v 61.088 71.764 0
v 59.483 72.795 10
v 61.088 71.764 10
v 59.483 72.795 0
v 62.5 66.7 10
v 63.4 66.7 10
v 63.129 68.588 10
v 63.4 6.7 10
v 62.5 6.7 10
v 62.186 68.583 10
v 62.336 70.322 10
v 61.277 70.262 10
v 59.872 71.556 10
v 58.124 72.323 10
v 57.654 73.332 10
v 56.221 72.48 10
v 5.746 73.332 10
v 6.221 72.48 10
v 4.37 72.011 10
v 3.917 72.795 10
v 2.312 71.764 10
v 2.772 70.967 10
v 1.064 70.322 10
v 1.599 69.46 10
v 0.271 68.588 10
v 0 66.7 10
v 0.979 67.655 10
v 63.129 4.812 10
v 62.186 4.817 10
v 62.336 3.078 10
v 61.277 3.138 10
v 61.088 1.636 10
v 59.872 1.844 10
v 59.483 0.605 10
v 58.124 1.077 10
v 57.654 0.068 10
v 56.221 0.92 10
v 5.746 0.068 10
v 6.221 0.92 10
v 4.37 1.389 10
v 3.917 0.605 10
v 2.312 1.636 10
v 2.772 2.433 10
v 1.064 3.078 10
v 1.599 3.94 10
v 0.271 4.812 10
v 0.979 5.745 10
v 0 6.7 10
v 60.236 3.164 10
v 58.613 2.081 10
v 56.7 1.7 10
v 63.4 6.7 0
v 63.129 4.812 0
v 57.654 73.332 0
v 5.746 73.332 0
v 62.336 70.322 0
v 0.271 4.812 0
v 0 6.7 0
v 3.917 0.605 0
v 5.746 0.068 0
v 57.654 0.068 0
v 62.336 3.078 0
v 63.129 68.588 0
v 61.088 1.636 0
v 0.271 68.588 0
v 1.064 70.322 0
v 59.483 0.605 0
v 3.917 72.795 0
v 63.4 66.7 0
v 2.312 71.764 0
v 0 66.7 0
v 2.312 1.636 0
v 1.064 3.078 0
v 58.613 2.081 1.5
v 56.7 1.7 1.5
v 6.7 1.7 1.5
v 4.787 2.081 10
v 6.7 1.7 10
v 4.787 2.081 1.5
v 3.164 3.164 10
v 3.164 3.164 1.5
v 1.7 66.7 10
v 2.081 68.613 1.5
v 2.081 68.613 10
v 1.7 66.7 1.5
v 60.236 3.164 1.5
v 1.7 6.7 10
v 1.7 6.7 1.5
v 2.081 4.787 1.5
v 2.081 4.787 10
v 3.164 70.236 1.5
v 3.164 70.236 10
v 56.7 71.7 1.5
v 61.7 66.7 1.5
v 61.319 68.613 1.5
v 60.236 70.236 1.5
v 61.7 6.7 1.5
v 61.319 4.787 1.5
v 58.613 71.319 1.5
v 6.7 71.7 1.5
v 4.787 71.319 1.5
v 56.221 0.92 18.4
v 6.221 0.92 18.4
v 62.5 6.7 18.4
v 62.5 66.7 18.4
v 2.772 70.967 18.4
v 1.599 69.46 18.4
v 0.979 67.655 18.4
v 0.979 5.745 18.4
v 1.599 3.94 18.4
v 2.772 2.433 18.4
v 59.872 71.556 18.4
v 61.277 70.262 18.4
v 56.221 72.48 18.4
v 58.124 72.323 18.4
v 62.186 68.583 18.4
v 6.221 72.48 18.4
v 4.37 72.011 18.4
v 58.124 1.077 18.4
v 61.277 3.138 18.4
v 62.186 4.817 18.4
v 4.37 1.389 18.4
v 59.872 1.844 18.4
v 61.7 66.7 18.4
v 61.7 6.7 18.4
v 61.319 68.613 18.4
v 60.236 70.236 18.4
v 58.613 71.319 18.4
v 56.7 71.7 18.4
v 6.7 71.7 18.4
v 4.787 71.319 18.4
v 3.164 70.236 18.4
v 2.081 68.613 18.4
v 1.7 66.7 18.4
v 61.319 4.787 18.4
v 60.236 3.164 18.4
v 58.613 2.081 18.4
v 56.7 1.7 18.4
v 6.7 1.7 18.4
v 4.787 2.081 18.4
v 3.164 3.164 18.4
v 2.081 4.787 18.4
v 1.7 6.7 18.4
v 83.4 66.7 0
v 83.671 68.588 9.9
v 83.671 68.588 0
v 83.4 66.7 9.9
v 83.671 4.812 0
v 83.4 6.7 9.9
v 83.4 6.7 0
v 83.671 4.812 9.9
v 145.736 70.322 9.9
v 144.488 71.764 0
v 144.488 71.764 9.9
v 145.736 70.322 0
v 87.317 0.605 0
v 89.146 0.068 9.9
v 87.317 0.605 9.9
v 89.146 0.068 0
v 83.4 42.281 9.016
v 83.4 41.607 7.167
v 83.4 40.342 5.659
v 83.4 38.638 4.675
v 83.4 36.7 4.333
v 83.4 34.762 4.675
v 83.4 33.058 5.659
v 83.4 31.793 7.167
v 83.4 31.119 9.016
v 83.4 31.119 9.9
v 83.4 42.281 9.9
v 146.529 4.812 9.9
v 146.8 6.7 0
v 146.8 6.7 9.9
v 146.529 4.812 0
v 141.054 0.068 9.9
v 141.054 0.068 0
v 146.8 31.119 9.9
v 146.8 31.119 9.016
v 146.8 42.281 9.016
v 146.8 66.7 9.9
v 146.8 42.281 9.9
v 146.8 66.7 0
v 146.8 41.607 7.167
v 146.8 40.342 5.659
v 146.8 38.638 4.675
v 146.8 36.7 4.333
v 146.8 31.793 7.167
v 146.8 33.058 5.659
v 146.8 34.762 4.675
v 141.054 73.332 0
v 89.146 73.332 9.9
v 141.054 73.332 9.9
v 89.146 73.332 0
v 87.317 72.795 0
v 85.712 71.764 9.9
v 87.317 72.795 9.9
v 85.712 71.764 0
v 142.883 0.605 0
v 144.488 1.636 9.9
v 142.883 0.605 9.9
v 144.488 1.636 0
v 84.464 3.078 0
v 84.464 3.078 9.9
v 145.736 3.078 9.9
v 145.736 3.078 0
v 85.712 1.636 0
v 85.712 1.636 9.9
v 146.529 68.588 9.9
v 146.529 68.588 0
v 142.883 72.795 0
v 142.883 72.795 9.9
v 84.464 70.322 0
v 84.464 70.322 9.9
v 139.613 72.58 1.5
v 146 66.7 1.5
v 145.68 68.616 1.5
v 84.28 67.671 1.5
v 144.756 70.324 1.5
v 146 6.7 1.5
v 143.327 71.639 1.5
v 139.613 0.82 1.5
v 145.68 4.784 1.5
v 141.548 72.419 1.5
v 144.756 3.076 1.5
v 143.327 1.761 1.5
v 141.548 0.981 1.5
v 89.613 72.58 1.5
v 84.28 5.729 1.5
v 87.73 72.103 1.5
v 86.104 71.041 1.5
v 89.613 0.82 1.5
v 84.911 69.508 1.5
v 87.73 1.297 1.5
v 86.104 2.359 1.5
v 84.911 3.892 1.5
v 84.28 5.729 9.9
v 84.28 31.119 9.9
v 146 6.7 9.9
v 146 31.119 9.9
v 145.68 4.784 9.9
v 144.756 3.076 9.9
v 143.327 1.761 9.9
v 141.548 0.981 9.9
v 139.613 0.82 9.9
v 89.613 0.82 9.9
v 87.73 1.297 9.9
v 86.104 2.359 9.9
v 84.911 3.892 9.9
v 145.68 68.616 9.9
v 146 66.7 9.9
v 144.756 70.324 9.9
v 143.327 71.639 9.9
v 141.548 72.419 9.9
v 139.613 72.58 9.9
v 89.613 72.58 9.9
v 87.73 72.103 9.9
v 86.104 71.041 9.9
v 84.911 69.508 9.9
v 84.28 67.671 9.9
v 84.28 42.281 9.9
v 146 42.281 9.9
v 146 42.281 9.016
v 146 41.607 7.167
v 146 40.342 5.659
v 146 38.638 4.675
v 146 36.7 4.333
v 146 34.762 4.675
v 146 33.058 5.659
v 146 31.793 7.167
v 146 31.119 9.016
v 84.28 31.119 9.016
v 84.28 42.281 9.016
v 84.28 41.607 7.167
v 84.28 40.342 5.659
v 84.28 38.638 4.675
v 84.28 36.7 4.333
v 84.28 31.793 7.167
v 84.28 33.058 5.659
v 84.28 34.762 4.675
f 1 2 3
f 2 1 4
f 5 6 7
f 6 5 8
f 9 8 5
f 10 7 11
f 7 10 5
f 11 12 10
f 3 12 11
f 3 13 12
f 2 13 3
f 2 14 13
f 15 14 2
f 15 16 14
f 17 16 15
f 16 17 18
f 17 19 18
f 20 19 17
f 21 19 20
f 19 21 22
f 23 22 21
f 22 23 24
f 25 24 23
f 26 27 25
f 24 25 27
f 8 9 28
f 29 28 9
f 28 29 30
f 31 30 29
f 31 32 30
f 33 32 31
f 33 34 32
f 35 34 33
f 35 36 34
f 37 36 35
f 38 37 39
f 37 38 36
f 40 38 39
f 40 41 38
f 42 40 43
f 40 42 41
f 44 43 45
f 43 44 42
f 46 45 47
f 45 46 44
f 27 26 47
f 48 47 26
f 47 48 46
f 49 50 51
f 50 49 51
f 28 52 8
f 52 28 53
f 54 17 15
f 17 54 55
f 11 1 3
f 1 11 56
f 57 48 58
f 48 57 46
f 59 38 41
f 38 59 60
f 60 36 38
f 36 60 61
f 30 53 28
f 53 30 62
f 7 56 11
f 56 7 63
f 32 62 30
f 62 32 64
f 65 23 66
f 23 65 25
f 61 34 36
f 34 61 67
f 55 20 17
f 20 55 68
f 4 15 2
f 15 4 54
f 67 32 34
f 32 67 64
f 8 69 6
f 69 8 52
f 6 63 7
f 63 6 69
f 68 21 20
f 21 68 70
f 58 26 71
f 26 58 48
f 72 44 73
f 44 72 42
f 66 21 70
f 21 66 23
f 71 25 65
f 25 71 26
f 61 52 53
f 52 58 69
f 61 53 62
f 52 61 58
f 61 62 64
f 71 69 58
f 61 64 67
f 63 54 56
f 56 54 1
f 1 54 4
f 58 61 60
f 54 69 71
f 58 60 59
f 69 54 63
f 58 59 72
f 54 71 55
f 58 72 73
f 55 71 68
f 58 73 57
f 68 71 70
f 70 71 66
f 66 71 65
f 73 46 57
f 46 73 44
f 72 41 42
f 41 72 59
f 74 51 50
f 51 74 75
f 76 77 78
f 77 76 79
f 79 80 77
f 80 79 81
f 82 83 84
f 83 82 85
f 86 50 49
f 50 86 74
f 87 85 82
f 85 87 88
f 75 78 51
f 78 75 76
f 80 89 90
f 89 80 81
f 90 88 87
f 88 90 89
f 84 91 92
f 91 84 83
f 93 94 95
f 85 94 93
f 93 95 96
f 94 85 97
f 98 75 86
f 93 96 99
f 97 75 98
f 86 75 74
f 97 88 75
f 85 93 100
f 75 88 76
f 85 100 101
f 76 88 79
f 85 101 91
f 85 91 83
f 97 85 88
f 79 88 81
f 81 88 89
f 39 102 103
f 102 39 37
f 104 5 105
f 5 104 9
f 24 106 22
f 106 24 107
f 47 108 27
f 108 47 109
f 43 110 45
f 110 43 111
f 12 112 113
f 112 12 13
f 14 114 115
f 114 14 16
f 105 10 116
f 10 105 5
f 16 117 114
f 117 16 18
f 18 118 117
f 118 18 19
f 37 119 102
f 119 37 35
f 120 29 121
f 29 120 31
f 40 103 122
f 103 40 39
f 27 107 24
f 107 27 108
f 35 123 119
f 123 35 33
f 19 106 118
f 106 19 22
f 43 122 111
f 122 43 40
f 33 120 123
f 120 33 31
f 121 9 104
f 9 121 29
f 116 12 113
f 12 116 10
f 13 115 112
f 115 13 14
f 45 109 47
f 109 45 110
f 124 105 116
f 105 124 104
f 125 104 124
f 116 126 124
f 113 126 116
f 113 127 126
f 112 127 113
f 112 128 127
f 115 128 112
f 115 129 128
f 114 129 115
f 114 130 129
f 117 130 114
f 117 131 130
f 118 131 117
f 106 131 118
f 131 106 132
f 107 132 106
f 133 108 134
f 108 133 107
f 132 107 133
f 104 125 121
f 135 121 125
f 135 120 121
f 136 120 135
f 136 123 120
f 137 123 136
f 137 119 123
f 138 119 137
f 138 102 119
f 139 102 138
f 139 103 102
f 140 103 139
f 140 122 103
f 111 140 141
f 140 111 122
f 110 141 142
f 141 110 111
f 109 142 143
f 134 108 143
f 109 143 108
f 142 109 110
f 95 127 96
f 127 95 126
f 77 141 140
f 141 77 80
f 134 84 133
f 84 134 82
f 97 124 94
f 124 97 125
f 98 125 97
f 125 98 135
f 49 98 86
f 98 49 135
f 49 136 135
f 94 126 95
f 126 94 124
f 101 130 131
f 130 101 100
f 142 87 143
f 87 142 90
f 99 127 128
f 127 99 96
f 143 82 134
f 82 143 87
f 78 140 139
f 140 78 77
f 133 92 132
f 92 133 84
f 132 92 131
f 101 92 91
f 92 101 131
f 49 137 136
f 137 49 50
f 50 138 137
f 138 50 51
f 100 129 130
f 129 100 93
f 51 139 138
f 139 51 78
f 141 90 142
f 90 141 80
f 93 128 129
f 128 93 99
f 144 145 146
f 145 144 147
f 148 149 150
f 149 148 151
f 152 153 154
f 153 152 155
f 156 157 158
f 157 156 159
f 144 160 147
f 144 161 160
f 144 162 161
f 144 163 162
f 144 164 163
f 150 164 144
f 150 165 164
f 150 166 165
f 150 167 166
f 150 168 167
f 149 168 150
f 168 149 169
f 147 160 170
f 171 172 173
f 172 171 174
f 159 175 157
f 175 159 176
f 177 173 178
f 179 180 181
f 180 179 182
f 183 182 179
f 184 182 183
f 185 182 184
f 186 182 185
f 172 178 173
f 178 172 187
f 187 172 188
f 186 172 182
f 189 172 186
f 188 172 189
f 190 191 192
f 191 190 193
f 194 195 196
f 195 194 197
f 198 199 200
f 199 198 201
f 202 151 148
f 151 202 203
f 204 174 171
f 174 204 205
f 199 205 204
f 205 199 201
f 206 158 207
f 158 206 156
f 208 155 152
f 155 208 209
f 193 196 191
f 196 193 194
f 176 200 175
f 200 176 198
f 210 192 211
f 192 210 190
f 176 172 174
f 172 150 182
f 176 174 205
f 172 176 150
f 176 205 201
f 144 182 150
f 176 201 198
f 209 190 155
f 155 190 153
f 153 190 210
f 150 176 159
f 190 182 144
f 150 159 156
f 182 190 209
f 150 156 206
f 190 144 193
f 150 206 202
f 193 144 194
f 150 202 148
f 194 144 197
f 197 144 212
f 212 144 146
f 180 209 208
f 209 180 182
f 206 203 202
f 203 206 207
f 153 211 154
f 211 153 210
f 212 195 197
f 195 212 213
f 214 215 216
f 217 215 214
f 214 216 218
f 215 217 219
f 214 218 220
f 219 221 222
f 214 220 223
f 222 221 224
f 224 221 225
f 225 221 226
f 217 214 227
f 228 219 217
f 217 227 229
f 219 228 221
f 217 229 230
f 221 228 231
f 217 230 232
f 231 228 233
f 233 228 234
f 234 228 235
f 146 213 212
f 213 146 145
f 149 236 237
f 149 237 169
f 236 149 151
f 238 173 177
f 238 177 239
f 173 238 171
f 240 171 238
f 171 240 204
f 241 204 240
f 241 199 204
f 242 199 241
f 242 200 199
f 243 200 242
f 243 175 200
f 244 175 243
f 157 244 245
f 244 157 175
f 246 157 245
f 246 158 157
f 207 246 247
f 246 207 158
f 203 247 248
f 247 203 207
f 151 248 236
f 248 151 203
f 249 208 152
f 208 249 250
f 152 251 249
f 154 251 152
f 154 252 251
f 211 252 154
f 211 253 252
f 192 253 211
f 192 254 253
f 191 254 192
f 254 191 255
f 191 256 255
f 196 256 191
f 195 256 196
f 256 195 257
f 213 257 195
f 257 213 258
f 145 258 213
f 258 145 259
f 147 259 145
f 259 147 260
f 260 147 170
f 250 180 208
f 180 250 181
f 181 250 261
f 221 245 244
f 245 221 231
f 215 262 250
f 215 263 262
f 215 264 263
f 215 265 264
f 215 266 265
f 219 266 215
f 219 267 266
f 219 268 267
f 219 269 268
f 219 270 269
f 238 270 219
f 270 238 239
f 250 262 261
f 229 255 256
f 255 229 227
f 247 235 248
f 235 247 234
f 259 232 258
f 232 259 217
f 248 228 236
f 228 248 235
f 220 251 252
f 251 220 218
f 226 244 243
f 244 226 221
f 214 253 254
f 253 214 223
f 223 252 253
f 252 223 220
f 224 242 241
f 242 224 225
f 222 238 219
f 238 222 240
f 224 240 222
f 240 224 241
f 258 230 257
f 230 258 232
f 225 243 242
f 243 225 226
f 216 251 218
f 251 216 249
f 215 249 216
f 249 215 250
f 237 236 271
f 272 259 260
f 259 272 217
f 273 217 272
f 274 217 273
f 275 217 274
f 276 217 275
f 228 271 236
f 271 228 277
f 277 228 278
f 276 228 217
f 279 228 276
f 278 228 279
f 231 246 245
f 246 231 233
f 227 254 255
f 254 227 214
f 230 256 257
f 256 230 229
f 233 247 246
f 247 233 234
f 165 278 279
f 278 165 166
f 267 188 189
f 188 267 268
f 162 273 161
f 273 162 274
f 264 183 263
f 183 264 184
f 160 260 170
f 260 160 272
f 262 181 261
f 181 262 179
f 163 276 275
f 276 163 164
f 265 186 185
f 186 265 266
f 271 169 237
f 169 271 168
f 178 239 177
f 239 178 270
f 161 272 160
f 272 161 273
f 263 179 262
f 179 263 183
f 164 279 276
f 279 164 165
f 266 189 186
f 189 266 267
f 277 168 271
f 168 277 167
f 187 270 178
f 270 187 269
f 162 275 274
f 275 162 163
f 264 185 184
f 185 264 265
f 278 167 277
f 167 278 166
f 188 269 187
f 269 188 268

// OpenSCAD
// file: lib_boxes6.scad
// lib_boxes6.scad

/**
x1 = width
y1 = depth
z1 = height
r1 = radius of corners
*/
module rounded_rectangle(x1, y1, z1, r1) {
    if (r1 > 0.00001) { // deal with rounding errors 
		translate([r1, r1, 0]) {
			minkowski () {
				cube([x1-2*r1, y1-2*r1, z1/2]);
				cylinder(z1/2, r1, r1);
			}
		}
	} else {
		cube([x1, y1, z1]);
	}
}

/**
x1 = width
y1 = depth
z1 = height
r1 = radius of corners
d1 = thickness
*/
module rounded_ring(x1, y1, z1, r1, d1) {
	difference () {
		rounded_rectangle(x1, y1, z1, r1);
		translate([d1, d1, 0]) {
			rounded_rectangle(x1-2*d1, y1-2*d1, z1+0.001, r1-d1);
		}
	}
}

/**
x1 = width
y1 = depth
z1 = height
r1 = radius of corners
d1 = wall thickness
d2 = bottom thickness
*/
module open_box(x1, y1, z1, r1, d1, d2) {
	rounded_rectangle(x1, y1, d2, r1);
	rounded_ring(x1, y1, z1, r1, d1);
}

/**
Bottom of a friction fit box
x1 = width
y1 = depth
z1 = height
r1 = radius of corners
d1 = wall thickness
z2 = friction
d2 = tolerance
d4 = bottom thickness
*/
module box_bottom(x1, y1, z1, r1, d1, z2, d2, d4) {
	x2 = d1/2+d2/2;
	y2 = d1/2+d2/2;
	x3 = x1-2*x2;
	y3 = y1-2*y2;
	r3 = max(r1-x2, 0);
	d3 = d1/2-d2/2;
	mm = floor(min(x1, y1)/10);

	difference() {
		union() {
			open_box(x1, y1, z1-z2, r1, d1, d4);
			translate([x2, y2, 0]) {
				rounded_ring(x3, y3, z1-d2, r3, d3, d4);
			}
		}
		*for (ii = [1 : mm]) {
			xx1 = 5*ii;
			xx2 = x1-10*ii;
			yy1 = 5*ii;
			yy2 = y1-10*ii;
			rr2 = r1-5*ii;
			translate([xx1, yy1, 0]) {
				rounded_ring(xx2, yy2, 0.65, rr2, 3);
			}
		}
	}
}

/**
Top of a friction fit box.
x1 = width
y1 = depth
z1 = height
r1 = radius of corners
d1 = wall thickness
z2 = friction
d2 = tolerance
d4 = top thickness
*/
module box_top(x1, y1, z1, r1, d1, z2, d2, d4) {
	x2 = d1/2+d2;
	y2 = d1/2+d2;
	x3 = x1-2*x2;
	y3 = y1-2*y2;
	z3 = z1+z2-d2;
	r3 = max(r1-x2, 0);
	d3 = d1/2-d2/2;
	mm = floor(min(x1, y1)/10);
	
	difference() {
		union() {
			open_box(x1, y1, z1-z2, r1, d1, d4);
			rounded_ring(x1, y1, z1-d2, r1, d3, d4);
		}

		*for (ii = [1 : mm]) {
			xx1 = 5*ii;
			xx2 = x1-10*ii;
			yy1 = 5*ii;
			yy2 = y1-10*ii;
			rr2 = r1-5*ii;
			translate([xx1, yy1, 0]) {
				rounded_ring(xx2, yy2, 0.65, rr2, 3);
			}
		}
	}
}

/**
x1 = width
y1 = depth
z1 = height
r1 = radius of corners
d1 = thickness
z2 = friction
d2 = tolerance
r2 = radius of fingers
*/
module fingers(x1, y1, z1, r1, d1, z2, d2, r2) {
	zz = max(z1, r2+d2);
    translate([0, y1/2, zz]) {
		rotate([0, 90, 0]) {
			translate([0, 0, -1]) {
				cylinder(x1+2, r2, r2);
			}
		}
	}
}

/**
x1 = width
y1 = depth
z1 = height
d1 = thickness
z2 = friction
d2 = tolerance
*/
module pimples(x1, y1, z1, d1, z2, d2) {
	translate([x1/2, (d1/2), z1-(z2/2)]) {
		sphere(d1/2);
	}
	translate([x1/2, y1-(d1/2), z1-(z2/2)]) {
		sphere(d1/2);
	}
}
// main file
// boxes5_text.scad

use <lib_boxes6.scad>

//$fn = 60.00;
x = 60.00;     // inner length
y = 70.00;     // inner depth
z = 17.00;     // inner height
r = 5.00;      // inner corner radius
f = z/2;       // friction
t = 0.1;      // tolerance
d1 = 0.40*4+t; // wall thickness
d2 = 1.5;
d3 = 1.5;

xc = x+2*d1;
yc = y+2*d1;
zb = z+d2;
zt = f+d3;
rc = r+d1;


//x1 = inner width
//y1 = inner depth
//z1 = inner height
//d1 = thickness
//r1 = radius of inner corners
//z2 = inner height of lid
//d2 = gap
//r2 = radius of finger cutouts
//f1 = sleeve the bottom


box_bottom(xc, yc, zb, rc, d1, f, t, d2);
translate([xc+20, 0, 0]) {
	difference() {
		box_top(xc, yc, zt, rc, d1, f, t, d3);
		fingers(xc, yc, zt, rc, d1, f, t, f*2/3);
	}
}

*translate([30+d1/2, d1, 0]) {
    cube([d, y, z]);
}
*translate([d1, 30+d1/2, 0]) {
    cube([x, d1, z]);
}
